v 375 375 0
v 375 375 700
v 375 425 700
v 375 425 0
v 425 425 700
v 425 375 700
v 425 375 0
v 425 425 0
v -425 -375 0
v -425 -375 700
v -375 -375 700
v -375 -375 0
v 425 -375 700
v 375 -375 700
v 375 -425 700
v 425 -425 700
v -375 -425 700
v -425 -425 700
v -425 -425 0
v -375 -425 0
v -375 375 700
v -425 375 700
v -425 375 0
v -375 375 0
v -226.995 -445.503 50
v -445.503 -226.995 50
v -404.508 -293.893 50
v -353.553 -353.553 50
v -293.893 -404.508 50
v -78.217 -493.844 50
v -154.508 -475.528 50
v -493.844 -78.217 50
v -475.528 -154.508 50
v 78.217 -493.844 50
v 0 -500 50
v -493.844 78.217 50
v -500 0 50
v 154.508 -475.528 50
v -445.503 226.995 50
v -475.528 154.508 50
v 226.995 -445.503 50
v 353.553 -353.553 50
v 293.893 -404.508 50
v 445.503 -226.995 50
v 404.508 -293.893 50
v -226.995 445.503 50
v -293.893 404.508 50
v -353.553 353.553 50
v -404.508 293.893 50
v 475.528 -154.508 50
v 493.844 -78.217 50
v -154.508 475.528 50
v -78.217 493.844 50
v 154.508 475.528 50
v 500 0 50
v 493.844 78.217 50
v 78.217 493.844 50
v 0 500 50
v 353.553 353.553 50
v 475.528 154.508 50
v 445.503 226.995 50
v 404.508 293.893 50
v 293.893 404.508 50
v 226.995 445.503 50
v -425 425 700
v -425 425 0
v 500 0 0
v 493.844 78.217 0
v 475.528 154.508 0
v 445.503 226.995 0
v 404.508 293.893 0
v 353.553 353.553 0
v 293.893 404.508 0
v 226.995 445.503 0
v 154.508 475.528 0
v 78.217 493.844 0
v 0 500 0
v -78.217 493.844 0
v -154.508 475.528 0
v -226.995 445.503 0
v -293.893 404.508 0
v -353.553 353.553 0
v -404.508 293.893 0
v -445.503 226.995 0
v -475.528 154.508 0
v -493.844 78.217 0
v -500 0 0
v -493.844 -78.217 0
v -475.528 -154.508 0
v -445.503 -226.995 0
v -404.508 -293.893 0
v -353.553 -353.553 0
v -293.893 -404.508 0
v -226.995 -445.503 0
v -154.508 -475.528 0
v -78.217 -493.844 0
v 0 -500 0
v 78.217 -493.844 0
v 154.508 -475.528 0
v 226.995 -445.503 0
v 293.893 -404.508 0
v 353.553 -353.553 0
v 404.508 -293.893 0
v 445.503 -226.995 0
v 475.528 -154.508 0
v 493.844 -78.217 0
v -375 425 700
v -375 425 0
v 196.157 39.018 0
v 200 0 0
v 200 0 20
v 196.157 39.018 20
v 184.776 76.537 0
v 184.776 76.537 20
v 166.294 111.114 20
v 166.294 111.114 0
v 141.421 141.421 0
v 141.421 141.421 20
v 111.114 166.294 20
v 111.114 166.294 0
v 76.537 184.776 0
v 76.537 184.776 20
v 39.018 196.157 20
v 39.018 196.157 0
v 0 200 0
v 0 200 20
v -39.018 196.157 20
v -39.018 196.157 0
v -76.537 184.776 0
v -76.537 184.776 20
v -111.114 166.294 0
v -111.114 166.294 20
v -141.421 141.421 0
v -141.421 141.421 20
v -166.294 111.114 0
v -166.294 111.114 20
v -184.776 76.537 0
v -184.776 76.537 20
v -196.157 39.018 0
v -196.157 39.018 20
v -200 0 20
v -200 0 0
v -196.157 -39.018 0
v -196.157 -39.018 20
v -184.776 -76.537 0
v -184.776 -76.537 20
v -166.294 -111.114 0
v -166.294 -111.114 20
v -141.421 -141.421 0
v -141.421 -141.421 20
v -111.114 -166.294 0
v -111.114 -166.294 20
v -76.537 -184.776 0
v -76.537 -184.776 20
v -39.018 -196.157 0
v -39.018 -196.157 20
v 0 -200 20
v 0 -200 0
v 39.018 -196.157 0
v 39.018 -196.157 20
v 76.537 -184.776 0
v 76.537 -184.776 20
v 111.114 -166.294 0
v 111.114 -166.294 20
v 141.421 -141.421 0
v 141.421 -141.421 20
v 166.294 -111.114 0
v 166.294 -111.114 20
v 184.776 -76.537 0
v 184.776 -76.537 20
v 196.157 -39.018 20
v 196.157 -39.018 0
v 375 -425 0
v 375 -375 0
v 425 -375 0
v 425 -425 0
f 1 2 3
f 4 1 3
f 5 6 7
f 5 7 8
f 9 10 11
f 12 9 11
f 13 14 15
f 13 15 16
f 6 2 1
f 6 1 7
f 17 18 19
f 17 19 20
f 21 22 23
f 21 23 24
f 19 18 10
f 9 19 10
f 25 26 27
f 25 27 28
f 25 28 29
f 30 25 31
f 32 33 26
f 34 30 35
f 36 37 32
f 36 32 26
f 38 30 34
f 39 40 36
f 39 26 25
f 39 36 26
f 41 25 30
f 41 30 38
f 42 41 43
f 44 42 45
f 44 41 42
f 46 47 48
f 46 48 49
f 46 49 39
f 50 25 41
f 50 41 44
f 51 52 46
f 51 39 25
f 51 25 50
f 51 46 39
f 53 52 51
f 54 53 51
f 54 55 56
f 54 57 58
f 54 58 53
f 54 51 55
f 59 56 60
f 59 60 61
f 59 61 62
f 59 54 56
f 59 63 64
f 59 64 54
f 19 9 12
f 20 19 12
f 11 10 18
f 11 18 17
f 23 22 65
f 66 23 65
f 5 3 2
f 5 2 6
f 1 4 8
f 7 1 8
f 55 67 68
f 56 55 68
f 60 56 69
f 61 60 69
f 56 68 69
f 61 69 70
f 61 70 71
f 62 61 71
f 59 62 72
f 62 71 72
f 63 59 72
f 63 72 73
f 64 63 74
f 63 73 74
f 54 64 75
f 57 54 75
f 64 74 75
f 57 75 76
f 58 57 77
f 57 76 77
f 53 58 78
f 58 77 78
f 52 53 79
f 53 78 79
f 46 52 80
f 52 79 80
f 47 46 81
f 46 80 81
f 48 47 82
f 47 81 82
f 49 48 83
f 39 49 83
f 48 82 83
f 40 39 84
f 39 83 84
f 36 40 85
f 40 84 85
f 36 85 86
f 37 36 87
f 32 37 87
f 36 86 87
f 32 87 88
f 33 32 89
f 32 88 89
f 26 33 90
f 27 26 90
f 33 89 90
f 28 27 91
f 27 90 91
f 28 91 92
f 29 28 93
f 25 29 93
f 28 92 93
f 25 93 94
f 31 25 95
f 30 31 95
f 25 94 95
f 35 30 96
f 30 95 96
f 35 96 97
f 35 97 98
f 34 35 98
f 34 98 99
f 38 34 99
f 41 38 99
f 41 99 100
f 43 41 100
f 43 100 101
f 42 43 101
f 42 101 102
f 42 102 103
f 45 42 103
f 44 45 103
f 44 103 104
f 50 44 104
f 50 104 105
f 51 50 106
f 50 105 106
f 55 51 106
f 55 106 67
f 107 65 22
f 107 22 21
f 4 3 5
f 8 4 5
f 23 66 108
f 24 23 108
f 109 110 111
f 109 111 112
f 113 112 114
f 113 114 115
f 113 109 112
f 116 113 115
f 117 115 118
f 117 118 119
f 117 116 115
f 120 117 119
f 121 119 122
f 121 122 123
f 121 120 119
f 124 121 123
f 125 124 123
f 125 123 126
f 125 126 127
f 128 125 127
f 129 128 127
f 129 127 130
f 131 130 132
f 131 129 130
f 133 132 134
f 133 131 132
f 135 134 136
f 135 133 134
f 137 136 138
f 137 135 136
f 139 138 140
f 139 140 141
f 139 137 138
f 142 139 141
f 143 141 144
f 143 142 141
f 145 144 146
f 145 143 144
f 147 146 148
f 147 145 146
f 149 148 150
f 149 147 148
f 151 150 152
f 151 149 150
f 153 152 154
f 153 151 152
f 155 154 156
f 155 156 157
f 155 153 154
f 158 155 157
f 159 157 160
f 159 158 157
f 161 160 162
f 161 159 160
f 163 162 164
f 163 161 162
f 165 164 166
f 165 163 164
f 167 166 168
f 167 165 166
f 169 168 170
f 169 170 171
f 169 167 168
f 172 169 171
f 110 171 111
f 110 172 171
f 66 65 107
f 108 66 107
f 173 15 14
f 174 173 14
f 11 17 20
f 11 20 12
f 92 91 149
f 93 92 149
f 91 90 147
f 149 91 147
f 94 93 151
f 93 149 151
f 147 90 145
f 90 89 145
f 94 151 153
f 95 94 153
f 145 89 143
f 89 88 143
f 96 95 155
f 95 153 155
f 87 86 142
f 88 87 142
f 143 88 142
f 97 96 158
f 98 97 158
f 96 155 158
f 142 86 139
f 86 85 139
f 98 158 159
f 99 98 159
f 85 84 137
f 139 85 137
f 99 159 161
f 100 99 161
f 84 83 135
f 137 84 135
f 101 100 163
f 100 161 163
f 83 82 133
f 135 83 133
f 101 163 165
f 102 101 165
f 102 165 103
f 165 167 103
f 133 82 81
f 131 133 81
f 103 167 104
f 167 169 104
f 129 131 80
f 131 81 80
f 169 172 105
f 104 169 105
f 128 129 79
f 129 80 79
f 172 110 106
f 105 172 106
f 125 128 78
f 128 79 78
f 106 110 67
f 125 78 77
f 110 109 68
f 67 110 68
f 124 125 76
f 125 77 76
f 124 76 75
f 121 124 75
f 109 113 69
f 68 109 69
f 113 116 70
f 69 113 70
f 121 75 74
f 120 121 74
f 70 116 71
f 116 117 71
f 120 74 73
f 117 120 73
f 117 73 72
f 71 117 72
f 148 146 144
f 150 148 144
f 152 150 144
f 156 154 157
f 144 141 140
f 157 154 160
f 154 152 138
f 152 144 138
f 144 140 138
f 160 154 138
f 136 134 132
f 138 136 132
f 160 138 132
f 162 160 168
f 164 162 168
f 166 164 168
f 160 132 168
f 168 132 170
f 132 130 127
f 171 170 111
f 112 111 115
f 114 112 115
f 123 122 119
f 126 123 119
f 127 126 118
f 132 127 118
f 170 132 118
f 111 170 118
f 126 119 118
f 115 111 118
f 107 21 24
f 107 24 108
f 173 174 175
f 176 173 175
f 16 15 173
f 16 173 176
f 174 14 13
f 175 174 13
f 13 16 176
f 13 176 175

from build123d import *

# Parameters (mm, degrees)
SKETCH_1_R          = 500
EXTRUDE_1_DEPTH     = 50
SKETCH_2_W          = 50
SKETCH_2_H          = 50
EXTRUDE_2_DEPTH     = 700
SKETCH_3_W          = 50
SKETCH_3_H          = 50
EXTRUDE_3_DEPTH     = 700
SKETCH_4_W          = 50
SKETCH_4_H          = 50
EXTRUDE_4_DEPTH     = 700
SKETCH_5_W          = 50
SKETCH_5_H          = 50
EXTRUDE_5_DEPTH     = 700
SKETCH_6_R          = 200
CUT_EXTRUDE_1_DEPTH = 20


with BuildPart() as part:
    # 草图1 → 凸台-拉伸1 (new body)
    with BuildSketch(Plane.XY):
        Circle(SKETCH_1_R)
    extrude(amount=EXTRUDE_1_DEPTH)

    # 草图6 → 切除-拉伸1 (cut)
    with BuildSketch(Plane.XY):
        Circle(SKETCH_6_R)
    extrude(amount=CUT_EXTRUDE_1_DEPTH, mode=Mode.SUBTRACT)


with BuildPart() as body_2:
    # 草图2 → 凸台-拉伸2 (new body)
    with BuildSketch(Plane.XY):
        with Locations((400, 400)):
            Rectangle(SKETCH_2_W, SKETCH_2_H)
    extrude(amount=EXTRUDE_2_DEPTH)


with BuildPart() as body_3:
    # 草图3 → 凸台-拉伸3 (new body)
    with BuildSketch(Plane.XY):
        with Locations((-400, 400)):
            Rectangle(SKETCH_3_W, SKETCH_3_H)
    extrude(amount=EXTRUDE_3_DEPTH)


with BuildPart() as body_4:
    # 草图4 → 凸台-拉伸4 (new body)
    with BuildSketch(Plane.XY):
        with Locations((400, -400)):
            Rectangle(SKETCH_4_W, SKETCH_4_H)
    extrude(amount=EXTRUDE_4_DEPTH)


with BuildPart() as body_5:
    # 草图5 → 凸台-拉伸5 (new body)
    with BuildSketch(Plane.XY):
        with Locations((-400, -400)):
            Rectangle(SKETCH_5_W, SKETCH_5_H)
    extrude(amount=EXTRUDE_5_DEPTH)


solid = Compound([part.part, body_2.part, body_3.part, body_4.part, body_5.part])
